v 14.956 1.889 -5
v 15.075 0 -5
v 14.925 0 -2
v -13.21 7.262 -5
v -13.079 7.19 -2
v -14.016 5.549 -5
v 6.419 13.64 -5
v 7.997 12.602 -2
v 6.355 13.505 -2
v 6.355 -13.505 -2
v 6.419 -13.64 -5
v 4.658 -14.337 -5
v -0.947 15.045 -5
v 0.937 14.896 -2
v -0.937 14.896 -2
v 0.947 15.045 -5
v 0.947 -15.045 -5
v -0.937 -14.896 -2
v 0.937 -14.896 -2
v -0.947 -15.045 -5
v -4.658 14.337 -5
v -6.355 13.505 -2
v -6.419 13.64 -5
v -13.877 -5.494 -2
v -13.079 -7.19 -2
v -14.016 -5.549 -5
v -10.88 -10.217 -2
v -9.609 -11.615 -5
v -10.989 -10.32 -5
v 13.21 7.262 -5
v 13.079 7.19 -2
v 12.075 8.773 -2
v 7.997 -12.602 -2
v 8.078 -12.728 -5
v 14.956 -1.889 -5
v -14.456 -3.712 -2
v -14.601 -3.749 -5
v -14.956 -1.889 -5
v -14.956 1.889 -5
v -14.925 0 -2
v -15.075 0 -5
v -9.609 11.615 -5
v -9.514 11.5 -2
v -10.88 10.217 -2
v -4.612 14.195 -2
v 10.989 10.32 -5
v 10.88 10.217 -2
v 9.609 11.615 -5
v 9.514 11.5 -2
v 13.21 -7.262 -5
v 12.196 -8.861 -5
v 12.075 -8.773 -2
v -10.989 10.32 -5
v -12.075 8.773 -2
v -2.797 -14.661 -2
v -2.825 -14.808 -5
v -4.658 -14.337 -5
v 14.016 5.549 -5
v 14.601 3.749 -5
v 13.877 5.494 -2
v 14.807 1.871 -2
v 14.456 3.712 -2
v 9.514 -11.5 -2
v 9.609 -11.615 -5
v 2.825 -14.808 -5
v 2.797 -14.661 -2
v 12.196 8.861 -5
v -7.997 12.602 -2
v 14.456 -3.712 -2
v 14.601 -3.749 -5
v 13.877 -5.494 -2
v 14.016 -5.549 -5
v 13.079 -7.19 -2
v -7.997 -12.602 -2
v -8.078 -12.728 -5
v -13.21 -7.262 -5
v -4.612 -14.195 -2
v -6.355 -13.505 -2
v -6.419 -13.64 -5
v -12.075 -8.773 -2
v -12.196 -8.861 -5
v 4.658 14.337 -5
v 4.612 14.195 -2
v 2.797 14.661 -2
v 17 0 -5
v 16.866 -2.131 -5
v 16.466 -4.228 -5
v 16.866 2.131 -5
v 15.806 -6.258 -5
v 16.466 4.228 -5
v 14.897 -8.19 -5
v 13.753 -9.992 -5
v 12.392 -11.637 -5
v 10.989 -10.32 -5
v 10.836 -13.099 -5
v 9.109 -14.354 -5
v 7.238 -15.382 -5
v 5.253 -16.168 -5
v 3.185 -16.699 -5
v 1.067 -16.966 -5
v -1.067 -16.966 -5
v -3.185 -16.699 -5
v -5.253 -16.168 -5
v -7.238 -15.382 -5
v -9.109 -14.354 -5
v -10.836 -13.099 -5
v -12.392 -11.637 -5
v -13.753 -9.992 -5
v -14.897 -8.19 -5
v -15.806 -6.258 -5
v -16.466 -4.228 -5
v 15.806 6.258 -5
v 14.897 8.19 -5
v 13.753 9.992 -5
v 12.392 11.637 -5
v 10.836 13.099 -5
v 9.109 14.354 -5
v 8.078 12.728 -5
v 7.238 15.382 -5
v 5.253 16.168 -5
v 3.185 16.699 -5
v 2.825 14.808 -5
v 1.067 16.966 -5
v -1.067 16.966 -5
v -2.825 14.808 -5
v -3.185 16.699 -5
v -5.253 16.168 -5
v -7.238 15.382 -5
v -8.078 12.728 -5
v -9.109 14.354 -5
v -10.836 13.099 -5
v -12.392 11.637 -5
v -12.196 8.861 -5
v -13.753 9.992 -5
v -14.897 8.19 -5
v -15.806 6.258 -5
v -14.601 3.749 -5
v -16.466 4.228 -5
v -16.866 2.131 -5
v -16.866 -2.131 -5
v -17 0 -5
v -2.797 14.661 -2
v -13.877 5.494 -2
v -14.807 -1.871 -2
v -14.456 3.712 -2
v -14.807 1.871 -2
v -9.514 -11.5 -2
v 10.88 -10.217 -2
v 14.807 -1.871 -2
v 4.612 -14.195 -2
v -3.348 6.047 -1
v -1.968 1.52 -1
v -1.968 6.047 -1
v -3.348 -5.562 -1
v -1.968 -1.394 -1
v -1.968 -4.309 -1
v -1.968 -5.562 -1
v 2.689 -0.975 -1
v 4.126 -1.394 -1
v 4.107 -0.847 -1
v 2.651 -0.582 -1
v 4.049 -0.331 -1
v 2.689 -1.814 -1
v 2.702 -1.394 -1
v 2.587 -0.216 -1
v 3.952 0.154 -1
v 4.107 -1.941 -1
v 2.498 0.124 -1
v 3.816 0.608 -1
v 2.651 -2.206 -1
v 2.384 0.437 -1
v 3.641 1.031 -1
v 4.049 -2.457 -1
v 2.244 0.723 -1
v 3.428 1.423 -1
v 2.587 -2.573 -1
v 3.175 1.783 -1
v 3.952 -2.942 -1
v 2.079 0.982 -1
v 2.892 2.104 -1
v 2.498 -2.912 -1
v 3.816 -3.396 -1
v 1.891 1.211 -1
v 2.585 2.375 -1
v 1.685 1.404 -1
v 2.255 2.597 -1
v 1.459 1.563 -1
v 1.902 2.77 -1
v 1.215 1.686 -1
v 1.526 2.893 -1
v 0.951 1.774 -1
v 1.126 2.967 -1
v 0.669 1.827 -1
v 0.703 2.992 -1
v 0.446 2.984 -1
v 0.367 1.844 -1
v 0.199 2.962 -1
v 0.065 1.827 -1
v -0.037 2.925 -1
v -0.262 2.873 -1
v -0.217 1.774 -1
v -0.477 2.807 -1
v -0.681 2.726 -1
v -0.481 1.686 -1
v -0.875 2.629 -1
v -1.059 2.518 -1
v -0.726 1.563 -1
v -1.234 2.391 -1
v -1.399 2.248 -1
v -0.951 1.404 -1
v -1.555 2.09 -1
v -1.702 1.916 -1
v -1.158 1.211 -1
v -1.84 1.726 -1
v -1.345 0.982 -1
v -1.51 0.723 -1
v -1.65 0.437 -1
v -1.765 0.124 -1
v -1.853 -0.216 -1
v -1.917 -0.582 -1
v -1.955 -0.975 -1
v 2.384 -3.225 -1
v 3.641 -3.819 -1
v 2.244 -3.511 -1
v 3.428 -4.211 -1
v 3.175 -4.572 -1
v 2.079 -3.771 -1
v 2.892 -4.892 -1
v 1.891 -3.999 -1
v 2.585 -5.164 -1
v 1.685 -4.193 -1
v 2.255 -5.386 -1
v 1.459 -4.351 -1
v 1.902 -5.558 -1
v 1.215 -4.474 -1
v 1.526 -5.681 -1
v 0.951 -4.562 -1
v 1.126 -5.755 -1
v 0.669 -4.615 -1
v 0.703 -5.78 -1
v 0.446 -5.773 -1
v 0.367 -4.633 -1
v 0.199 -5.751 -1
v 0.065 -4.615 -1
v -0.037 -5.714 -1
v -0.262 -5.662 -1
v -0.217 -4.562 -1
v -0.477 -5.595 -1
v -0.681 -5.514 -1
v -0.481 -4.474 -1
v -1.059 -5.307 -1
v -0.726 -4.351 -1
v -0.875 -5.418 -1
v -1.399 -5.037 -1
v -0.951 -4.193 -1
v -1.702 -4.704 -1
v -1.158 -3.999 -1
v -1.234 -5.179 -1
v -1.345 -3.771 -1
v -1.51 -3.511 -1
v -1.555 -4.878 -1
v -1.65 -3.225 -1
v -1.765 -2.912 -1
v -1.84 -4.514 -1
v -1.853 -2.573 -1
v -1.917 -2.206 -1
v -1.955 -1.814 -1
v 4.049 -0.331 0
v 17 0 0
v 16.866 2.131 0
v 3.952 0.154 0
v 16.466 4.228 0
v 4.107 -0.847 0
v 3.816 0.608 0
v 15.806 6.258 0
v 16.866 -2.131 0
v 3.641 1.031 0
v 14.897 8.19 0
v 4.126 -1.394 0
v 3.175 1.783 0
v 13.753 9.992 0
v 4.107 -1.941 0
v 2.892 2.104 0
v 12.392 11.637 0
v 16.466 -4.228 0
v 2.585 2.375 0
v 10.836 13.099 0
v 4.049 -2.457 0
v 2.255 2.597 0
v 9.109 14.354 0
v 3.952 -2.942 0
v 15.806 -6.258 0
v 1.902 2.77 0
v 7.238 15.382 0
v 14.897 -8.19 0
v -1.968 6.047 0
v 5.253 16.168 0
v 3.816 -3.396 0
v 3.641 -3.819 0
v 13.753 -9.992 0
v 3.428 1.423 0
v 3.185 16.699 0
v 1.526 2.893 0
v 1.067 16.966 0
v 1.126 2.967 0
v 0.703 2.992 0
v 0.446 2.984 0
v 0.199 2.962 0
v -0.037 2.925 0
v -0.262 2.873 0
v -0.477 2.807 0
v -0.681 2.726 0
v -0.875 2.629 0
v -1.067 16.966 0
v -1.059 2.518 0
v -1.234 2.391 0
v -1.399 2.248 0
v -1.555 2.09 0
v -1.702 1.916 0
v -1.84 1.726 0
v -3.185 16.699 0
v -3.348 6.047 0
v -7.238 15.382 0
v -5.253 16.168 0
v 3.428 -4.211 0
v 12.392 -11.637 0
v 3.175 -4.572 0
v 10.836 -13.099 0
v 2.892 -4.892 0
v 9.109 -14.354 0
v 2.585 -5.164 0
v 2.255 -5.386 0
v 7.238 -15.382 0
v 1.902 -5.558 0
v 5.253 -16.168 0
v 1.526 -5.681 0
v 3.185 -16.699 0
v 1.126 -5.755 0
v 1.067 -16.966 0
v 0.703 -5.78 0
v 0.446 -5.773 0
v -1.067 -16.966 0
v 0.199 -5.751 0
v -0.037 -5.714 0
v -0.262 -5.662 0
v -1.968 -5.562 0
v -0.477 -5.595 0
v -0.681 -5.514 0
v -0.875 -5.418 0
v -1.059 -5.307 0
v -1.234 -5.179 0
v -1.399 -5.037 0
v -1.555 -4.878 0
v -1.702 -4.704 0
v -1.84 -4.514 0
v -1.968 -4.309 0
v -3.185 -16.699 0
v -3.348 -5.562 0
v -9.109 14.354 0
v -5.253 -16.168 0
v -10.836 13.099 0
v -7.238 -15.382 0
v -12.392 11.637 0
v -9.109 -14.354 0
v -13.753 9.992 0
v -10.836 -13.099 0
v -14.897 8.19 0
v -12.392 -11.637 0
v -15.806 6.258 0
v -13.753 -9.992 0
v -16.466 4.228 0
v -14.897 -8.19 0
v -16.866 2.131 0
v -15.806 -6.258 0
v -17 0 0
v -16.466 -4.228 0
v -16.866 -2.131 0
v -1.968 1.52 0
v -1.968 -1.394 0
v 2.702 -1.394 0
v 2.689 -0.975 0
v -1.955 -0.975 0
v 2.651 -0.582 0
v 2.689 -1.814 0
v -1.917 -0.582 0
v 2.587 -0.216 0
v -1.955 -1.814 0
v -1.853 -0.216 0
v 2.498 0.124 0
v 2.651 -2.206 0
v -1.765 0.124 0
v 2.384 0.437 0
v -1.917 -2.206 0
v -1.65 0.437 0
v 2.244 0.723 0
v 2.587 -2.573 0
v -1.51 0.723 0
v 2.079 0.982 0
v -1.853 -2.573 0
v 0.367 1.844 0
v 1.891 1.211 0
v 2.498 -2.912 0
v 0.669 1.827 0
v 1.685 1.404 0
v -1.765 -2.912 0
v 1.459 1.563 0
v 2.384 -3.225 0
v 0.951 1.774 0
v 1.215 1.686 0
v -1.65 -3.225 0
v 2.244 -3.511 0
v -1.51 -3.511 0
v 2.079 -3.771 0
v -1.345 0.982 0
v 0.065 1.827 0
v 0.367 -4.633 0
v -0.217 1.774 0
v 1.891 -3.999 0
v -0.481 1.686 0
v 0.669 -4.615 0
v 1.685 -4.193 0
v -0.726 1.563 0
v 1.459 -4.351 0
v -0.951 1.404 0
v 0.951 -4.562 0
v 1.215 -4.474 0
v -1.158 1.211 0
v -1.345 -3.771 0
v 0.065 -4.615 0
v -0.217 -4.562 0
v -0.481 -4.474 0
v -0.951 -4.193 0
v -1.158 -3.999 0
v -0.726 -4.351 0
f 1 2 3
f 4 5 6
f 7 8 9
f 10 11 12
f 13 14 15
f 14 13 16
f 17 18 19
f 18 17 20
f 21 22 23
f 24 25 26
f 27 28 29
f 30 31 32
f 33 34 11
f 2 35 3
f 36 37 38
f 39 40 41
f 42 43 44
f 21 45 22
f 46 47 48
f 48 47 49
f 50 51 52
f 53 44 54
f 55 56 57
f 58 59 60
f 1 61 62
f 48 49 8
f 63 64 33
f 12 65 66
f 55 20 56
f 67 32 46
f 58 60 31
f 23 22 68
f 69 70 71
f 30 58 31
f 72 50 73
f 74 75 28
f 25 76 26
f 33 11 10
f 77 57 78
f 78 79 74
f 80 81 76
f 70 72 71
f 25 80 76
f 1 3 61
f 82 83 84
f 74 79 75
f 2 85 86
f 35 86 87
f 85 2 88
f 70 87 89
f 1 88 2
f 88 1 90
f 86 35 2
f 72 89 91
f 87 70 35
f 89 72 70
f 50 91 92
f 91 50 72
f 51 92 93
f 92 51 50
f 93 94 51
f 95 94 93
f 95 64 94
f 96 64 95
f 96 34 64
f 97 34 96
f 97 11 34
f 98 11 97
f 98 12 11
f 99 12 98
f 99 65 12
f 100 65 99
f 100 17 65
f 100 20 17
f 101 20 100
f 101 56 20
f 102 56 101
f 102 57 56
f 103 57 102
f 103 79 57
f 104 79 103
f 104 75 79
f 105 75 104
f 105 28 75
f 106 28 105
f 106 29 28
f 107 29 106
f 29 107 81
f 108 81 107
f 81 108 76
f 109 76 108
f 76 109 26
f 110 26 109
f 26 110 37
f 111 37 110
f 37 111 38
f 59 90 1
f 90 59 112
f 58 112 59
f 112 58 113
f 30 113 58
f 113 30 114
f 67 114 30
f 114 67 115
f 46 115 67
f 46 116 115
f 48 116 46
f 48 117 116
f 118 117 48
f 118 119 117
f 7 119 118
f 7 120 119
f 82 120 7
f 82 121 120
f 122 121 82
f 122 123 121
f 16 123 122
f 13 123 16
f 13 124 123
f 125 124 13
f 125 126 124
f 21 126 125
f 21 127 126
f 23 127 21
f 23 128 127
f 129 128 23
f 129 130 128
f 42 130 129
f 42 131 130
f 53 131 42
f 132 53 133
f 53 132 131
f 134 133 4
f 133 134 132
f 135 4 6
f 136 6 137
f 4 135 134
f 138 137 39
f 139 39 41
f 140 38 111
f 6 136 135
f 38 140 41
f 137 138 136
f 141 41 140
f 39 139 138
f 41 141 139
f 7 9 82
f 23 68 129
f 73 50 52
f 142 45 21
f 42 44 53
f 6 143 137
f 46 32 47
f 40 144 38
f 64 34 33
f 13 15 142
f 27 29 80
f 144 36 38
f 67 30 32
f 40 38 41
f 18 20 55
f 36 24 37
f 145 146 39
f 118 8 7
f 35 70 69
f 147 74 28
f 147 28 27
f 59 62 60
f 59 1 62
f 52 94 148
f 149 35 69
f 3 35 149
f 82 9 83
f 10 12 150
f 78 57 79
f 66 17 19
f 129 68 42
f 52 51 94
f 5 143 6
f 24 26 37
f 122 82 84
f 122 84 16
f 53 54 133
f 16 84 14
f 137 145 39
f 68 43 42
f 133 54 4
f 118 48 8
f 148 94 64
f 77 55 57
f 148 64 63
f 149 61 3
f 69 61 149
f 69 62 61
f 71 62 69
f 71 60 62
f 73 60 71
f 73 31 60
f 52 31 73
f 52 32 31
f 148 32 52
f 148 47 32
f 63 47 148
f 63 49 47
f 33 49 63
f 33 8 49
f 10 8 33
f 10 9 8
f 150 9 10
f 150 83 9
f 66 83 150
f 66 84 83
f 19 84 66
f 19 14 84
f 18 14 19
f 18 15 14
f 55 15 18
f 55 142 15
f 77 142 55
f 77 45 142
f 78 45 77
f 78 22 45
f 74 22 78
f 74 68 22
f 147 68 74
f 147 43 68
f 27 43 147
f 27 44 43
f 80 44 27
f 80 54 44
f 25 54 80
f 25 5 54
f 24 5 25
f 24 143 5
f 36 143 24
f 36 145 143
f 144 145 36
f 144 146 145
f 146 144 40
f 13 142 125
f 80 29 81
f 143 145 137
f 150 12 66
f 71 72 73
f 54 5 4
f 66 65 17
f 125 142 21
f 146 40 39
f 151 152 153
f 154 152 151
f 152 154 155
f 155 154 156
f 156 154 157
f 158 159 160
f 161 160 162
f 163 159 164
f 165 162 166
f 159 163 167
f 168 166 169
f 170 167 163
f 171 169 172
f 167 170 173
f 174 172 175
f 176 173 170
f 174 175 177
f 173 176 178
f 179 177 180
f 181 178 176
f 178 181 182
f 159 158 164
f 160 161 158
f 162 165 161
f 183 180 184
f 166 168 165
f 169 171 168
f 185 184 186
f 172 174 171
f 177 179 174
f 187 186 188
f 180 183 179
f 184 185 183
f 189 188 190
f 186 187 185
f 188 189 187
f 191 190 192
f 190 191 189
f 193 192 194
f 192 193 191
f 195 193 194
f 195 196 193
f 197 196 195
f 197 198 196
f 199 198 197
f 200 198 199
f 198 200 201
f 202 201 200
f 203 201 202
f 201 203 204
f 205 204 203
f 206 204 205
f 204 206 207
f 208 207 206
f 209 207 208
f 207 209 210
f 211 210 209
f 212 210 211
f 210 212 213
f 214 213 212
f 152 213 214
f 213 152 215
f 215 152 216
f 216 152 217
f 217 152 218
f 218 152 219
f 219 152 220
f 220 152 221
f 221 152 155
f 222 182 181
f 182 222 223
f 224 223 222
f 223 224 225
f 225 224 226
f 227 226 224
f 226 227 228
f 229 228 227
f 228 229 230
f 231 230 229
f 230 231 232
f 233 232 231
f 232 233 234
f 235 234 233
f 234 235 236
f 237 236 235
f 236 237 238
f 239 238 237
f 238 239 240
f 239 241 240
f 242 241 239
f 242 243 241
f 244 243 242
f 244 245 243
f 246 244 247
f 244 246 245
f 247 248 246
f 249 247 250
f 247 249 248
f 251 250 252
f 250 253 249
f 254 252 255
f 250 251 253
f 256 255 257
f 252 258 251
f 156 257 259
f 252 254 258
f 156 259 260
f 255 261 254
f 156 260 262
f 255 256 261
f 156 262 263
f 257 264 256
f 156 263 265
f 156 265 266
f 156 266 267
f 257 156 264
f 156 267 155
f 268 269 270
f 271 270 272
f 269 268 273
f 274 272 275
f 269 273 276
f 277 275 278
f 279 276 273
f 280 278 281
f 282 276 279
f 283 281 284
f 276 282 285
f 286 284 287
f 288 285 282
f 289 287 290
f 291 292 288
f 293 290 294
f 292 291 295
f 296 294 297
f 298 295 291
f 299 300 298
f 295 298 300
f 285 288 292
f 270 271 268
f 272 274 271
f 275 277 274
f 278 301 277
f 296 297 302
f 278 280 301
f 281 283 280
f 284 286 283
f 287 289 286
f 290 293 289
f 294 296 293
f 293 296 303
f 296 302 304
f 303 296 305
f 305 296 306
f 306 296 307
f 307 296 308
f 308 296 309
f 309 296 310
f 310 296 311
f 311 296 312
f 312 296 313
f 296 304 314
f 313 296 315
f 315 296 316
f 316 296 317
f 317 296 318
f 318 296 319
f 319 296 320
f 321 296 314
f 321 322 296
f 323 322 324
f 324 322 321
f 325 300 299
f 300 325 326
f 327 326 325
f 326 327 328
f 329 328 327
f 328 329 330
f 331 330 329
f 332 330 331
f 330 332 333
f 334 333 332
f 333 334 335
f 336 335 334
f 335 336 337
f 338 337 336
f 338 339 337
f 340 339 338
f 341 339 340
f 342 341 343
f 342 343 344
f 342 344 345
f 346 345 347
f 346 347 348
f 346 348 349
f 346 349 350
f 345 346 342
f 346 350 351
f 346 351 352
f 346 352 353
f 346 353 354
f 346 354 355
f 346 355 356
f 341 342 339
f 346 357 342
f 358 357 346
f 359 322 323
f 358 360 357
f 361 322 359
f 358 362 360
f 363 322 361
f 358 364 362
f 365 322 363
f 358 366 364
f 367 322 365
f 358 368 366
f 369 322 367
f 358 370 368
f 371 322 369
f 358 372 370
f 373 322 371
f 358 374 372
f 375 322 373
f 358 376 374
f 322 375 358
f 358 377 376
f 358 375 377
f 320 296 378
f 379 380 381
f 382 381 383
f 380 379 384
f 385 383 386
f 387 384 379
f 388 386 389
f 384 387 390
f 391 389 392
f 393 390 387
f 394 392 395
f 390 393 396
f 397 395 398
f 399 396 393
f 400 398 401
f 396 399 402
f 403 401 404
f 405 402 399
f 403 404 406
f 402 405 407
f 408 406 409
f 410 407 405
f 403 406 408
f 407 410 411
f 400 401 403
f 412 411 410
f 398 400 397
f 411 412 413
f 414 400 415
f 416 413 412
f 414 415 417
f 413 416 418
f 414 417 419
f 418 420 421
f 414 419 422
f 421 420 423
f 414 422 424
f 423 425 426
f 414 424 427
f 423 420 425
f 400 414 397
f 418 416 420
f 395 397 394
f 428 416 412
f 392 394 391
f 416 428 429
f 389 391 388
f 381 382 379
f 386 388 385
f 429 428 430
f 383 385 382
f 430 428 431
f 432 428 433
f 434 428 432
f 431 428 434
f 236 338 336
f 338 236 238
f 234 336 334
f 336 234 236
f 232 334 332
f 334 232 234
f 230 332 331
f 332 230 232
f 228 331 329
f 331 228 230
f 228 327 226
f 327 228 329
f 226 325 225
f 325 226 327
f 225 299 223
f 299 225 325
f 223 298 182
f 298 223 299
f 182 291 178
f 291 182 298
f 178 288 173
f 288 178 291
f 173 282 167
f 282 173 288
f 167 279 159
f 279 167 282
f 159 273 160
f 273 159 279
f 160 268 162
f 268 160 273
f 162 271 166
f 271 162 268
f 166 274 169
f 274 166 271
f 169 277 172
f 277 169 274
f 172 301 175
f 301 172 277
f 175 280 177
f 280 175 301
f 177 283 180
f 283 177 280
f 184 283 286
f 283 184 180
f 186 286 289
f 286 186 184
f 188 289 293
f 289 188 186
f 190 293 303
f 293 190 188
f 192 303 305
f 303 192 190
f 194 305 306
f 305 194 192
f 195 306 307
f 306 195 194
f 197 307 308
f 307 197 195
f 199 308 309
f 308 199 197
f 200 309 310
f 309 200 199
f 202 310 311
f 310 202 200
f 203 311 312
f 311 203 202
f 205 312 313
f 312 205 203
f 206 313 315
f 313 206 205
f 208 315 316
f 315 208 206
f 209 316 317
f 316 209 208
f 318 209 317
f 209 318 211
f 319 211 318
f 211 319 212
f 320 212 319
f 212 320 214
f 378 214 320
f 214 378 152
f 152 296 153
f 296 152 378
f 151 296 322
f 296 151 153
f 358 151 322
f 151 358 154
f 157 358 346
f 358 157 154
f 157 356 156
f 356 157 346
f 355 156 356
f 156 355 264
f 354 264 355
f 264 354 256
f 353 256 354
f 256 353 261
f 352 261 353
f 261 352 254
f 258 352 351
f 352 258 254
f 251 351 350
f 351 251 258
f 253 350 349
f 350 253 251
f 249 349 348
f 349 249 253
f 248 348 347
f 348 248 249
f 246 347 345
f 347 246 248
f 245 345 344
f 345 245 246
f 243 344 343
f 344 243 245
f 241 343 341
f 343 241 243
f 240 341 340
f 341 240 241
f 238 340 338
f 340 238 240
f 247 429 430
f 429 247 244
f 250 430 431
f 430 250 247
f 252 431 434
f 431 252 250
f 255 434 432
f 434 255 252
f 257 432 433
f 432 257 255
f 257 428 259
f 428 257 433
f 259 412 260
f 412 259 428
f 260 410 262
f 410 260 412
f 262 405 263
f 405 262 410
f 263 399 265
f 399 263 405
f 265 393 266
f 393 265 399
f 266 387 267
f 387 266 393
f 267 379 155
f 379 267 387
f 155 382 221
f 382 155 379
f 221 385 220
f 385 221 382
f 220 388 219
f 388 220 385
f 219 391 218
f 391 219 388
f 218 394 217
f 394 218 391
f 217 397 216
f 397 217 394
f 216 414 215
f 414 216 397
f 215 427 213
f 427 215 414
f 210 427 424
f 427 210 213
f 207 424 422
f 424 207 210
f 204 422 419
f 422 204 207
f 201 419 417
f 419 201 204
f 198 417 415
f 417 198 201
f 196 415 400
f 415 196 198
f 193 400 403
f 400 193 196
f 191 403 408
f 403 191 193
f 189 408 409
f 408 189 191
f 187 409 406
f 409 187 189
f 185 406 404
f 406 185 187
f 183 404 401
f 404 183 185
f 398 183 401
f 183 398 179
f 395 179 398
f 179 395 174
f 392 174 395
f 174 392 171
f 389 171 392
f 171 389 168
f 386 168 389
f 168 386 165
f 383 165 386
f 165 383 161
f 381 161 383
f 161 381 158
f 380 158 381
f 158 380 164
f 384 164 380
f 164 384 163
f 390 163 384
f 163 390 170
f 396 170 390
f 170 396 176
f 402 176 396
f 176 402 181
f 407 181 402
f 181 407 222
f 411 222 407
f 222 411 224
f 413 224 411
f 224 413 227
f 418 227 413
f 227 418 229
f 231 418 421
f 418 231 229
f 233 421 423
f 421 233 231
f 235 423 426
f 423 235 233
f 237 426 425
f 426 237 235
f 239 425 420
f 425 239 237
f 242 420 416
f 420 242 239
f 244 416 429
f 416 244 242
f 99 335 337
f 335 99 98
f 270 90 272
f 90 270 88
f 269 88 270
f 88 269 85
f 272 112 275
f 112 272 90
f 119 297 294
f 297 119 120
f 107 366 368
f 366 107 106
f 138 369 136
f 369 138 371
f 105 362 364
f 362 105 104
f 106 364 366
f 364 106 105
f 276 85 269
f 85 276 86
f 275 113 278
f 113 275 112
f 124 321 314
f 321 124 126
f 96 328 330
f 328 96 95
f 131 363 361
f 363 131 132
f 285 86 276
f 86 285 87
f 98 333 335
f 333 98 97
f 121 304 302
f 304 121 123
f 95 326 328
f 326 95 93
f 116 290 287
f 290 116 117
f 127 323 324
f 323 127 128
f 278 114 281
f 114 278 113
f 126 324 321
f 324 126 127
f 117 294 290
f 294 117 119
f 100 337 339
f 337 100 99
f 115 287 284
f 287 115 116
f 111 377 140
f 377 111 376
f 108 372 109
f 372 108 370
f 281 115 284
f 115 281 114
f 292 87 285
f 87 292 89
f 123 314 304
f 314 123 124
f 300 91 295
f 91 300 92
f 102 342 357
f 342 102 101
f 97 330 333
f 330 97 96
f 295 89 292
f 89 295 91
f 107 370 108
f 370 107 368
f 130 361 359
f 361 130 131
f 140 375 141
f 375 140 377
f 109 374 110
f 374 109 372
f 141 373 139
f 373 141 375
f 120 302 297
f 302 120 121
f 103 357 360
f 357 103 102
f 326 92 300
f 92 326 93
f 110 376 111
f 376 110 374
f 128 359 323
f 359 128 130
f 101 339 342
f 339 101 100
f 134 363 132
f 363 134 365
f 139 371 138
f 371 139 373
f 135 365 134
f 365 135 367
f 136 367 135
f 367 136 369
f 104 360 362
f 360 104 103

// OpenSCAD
$fn = 50;


difference() {
	union() {
		translate(v = [0, 0, -5.0000000000]) {
			cylinder(h = 5, r = 17.0000000000);
		}
	}
	union() {
		#translate(v = [0, 0, -5.0000000000]) {
			cylinder(h = 3, r1 = 15.0750000000, r2 = 14.9250000000);
		}
		translate(v = [0, 0, -1]) {
			linear_extrude(height = 1) {
				text(font = "Webdings", halign = "center", size = 11, text = "b", valign = "center");
			}
		}
	}
}
